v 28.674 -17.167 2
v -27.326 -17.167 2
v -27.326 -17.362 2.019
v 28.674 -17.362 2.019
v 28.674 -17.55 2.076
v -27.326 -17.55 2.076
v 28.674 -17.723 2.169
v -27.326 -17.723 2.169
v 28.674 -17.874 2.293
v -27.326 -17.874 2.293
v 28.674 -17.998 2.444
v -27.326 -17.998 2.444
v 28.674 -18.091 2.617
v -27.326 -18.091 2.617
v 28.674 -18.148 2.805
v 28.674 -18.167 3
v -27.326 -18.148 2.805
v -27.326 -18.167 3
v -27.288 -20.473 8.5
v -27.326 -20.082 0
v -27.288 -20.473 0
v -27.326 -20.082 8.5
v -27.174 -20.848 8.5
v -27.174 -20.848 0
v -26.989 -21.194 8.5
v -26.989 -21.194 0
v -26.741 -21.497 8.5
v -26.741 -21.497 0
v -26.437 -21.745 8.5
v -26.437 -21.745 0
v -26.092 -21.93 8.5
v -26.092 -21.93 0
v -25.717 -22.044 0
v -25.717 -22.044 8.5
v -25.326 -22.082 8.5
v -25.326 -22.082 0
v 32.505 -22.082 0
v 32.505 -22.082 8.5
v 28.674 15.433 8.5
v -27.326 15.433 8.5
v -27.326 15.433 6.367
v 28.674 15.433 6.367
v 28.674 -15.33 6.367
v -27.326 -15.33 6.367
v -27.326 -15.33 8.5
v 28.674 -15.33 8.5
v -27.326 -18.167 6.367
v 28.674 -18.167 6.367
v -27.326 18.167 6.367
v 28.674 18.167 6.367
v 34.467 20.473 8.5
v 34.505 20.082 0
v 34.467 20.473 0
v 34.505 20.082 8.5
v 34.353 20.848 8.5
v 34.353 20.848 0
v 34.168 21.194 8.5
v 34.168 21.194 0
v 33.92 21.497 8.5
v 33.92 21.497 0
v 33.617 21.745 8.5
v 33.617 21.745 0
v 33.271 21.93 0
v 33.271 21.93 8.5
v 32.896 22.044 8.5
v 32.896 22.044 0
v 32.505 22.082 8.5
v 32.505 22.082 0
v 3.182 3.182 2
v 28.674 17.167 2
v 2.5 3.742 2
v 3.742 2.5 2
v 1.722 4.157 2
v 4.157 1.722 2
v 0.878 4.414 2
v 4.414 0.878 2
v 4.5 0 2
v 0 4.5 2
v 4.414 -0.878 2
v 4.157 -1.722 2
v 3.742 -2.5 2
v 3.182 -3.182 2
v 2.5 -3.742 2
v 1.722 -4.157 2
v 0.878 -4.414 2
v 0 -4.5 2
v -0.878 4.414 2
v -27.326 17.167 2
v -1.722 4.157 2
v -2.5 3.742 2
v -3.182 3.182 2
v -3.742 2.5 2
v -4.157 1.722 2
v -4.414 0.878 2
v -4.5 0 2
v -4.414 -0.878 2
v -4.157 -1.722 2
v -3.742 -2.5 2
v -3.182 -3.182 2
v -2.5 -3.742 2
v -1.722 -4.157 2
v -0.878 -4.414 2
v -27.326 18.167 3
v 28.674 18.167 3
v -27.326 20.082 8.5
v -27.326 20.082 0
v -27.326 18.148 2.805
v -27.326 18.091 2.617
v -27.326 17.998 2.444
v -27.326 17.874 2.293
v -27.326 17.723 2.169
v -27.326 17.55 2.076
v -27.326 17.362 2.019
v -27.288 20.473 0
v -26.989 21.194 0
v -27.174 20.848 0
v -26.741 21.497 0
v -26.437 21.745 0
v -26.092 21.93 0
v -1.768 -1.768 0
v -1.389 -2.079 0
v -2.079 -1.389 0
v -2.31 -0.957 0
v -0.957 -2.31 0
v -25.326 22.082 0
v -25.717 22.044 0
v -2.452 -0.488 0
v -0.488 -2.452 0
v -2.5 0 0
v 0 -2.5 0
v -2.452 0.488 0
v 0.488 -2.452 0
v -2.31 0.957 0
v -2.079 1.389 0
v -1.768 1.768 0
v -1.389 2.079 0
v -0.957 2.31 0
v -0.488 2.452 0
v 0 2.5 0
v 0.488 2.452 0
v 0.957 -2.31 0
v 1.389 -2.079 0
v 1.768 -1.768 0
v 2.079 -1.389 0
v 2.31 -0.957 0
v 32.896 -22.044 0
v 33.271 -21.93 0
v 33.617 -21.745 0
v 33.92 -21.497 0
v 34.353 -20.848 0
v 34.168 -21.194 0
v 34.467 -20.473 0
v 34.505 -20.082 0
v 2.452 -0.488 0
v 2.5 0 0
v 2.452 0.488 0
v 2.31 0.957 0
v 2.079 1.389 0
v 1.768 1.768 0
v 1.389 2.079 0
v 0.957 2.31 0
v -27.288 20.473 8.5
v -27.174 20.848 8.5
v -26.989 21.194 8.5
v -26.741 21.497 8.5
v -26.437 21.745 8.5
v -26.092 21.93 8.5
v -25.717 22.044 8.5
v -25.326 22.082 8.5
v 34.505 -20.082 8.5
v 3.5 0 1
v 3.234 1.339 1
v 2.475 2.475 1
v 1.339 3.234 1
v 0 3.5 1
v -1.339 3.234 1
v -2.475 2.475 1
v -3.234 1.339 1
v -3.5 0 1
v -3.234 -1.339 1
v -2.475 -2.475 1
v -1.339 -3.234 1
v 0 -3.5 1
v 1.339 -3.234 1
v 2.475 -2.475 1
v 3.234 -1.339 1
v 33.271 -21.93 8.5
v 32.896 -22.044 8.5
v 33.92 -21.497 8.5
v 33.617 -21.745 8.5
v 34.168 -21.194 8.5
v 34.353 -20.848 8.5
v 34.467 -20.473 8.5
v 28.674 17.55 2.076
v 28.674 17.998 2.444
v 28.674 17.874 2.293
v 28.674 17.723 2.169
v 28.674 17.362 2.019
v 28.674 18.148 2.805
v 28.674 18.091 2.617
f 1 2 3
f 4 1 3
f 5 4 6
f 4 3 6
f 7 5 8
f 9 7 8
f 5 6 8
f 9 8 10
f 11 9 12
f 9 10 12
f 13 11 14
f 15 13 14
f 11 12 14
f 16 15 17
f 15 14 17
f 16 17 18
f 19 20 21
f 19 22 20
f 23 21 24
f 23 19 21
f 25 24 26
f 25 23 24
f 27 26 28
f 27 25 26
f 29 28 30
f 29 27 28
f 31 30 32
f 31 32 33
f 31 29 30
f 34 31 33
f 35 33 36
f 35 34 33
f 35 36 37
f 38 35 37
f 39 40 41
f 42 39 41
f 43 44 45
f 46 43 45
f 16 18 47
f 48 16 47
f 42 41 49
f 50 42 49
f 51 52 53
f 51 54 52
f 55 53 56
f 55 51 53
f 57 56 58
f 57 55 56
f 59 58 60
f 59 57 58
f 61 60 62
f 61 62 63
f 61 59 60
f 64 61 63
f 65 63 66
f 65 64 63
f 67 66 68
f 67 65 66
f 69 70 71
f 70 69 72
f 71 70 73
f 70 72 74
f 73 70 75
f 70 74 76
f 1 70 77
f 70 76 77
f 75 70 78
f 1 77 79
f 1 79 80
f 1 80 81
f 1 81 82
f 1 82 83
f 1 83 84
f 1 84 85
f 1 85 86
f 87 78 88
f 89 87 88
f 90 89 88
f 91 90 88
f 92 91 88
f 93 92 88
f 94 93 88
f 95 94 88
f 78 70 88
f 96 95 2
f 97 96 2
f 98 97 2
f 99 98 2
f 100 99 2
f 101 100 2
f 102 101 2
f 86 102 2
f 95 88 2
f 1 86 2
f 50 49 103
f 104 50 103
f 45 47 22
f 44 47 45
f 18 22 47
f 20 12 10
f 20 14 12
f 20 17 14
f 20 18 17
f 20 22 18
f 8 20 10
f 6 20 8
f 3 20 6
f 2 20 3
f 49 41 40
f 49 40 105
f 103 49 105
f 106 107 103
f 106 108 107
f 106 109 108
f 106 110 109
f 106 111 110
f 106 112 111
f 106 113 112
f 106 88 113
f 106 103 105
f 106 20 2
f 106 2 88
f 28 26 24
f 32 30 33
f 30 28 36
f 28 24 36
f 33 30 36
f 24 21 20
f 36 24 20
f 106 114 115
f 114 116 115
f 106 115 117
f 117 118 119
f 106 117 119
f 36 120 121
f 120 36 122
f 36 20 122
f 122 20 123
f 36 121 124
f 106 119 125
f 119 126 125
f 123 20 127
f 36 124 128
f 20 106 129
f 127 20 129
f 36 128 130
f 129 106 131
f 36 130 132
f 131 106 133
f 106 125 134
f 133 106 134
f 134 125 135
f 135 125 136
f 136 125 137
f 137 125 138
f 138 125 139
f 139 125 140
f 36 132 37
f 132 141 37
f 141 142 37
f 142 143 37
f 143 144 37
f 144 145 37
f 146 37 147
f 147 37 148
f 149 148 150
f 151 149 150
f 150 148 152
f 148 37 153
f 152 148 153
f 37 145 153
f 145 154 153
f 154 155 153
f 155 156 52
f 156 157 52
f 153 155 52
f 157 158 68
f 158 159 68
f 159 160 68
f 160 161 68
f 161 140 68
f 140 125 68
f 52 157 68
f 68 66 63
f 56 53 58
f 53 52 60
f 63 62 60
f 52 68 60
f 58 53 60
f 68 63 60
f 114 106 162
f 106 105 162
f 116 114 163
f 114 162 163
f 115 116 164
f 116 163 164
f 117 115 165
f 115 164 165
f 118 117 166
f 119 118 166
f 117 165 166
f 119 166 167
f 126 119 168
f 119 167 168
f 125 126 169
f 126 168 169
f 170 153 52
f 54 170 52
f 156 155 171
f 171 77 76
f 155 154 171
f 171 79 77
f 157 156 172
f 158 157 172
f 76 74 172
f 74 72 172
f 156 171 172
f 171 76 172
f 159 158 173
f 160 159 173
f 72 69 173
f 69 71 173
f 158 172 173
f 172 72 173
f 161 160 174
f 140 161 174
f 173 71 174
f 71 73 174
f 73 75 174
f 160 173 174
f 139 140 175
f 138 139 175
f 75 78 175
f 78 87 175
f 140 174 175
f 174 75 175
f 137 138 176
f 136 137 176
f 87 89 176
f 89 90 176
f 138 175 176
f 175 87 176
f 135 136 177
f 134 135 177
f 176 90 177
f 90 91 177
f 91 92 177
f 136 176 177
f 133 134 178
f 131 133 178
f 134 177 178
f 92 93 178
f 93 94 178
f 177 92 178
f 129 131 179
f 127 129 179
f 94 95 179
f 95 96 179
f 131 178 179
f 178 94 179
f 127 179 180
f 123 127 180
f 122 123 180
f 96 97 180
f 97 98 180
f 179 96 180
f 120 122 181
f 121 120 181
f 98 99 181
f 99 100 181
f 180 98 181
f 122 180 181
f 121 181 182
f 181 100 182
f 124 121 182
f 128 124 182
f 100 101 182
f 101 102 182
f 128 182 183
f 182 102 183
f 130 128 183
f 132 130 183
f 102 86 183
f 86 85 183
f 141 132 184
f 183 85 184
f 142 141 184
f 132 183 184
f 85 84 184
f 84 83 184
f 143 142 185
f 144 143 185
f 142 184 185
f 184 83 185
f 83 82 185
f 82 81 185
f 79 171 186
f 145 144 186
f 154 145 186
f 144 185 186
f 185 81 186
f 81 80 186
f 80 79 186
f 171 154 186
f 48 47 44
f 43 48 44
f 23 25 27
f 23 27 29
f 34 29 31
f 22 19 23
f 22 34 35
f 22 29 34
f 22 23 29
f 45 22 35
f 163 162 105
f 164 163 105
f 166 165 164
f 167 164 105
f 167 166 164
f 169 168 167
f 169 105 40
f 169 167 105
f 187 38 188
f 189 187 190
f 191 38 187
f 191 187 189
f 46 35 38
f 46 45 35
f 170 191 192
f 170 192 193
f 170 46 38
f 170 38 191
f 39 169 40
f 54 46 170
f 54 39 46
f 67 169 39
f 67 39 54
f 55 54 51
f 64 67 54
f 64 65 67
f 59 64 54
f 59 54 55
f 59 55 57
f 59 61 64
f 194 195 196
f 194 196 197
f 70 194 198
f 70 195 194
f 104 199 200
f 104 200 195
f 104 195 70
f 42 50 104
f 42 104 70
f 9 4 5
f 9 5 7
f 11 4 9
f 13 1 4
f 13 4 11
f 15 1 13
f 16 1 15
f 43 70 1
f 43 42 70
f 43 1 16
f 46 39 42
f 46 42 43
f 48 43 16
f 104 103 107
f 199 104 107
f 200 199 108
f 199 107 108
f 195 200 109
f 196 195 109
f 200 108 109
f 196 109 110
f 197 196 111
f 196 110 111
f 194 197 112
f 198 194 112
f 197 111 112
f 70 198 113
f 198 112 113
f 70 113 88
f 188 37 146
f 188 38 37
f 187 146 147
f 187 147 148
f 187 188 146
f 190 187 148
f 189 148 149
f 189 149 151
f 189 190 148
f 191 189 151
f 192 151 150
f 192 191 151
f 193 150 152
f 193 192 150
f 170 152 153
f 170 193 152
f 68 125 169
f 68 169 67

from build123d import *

# Parameters (mm, degrees)
F0_W     = 61.8317574263
F0_H     = 44.1648438573
F1_DEPTH = 8.5
F2_R     = 2
F4_DEPTH = 56
F5_R     = 2.5
F6_DEPTH = 25
F6_TAPER = -45


with BuildPart() as f1:
    # F0 (on Top) → F1 (new body)
    with BuildSketch(Plane.XY):
        with Locations((3.5895518959, 0)):
            Rectangle(F0_W, F0_H)
    extrude(amount=F1_DEPTH)

    # F2
    f2_edges = [f1.edges().sort_by_distance(p)[0] for p in [
        (-27.326327, -22.082422, 4.25),
        (34.505431, -22.082422, 4.25),
        (-27.326327, 22.082422, 4.25),
        (34.505431, 22.082422, 4.25),
    ]]
    fillet(f2_edges, radius=F2_R)

    # F3 (on face) → F4 (cut)
    with BuildSketch(Plane(origin=(-27.3263268173, 0, 0), x_dir=(0, -1, 0), z_dir=(-1, 0, 0))):
        with BuildLine():
            ThreePointArc((-18.1670283088, 3), (-17.87413509, 2.2928932188), (-17.1670283088, 2))
            Line((-17.1670283088, 2), (17.1670283088, 2))
            ThreePointArc((17.1670283088, 2), (17.87413509, 2.2928932188), (18.1670283088, 3))
            Line((18.1670283088, 3), (18.1670283088, 6.3671339807))
            Line((18.1670283088, 6.3671339807), (15.3303788975, 6.3671339807))
            Line((15.3303788975, 6.3671339807), (15.3303788975, 8.5))
            Line((15.3303788975, 8.5), (-15.4332136735, 8.5))
            Line((-15.4332136735, 8.5), (-15.4332136735, 6.3671339807))
            Line((-15.4332136735, 6.3671339807), (-18.1670283088, 6.3671339807))
            Line((-18.1670283088, 6.3671339807), (-18.1670283088, 3))
        make_face()
    extrude(amount=-F4_DEPTH, mode=Mode.SUBTRACT)

    # F5 (on Top) → F6 (cut)
    with BuildSketch(Plane.XY):
        Circle(F5_R)
    extrude(amount=F6_DEPTH, taper=F6_TAPER, mode=Mode.SUBTRACT)


solid = f1.part
